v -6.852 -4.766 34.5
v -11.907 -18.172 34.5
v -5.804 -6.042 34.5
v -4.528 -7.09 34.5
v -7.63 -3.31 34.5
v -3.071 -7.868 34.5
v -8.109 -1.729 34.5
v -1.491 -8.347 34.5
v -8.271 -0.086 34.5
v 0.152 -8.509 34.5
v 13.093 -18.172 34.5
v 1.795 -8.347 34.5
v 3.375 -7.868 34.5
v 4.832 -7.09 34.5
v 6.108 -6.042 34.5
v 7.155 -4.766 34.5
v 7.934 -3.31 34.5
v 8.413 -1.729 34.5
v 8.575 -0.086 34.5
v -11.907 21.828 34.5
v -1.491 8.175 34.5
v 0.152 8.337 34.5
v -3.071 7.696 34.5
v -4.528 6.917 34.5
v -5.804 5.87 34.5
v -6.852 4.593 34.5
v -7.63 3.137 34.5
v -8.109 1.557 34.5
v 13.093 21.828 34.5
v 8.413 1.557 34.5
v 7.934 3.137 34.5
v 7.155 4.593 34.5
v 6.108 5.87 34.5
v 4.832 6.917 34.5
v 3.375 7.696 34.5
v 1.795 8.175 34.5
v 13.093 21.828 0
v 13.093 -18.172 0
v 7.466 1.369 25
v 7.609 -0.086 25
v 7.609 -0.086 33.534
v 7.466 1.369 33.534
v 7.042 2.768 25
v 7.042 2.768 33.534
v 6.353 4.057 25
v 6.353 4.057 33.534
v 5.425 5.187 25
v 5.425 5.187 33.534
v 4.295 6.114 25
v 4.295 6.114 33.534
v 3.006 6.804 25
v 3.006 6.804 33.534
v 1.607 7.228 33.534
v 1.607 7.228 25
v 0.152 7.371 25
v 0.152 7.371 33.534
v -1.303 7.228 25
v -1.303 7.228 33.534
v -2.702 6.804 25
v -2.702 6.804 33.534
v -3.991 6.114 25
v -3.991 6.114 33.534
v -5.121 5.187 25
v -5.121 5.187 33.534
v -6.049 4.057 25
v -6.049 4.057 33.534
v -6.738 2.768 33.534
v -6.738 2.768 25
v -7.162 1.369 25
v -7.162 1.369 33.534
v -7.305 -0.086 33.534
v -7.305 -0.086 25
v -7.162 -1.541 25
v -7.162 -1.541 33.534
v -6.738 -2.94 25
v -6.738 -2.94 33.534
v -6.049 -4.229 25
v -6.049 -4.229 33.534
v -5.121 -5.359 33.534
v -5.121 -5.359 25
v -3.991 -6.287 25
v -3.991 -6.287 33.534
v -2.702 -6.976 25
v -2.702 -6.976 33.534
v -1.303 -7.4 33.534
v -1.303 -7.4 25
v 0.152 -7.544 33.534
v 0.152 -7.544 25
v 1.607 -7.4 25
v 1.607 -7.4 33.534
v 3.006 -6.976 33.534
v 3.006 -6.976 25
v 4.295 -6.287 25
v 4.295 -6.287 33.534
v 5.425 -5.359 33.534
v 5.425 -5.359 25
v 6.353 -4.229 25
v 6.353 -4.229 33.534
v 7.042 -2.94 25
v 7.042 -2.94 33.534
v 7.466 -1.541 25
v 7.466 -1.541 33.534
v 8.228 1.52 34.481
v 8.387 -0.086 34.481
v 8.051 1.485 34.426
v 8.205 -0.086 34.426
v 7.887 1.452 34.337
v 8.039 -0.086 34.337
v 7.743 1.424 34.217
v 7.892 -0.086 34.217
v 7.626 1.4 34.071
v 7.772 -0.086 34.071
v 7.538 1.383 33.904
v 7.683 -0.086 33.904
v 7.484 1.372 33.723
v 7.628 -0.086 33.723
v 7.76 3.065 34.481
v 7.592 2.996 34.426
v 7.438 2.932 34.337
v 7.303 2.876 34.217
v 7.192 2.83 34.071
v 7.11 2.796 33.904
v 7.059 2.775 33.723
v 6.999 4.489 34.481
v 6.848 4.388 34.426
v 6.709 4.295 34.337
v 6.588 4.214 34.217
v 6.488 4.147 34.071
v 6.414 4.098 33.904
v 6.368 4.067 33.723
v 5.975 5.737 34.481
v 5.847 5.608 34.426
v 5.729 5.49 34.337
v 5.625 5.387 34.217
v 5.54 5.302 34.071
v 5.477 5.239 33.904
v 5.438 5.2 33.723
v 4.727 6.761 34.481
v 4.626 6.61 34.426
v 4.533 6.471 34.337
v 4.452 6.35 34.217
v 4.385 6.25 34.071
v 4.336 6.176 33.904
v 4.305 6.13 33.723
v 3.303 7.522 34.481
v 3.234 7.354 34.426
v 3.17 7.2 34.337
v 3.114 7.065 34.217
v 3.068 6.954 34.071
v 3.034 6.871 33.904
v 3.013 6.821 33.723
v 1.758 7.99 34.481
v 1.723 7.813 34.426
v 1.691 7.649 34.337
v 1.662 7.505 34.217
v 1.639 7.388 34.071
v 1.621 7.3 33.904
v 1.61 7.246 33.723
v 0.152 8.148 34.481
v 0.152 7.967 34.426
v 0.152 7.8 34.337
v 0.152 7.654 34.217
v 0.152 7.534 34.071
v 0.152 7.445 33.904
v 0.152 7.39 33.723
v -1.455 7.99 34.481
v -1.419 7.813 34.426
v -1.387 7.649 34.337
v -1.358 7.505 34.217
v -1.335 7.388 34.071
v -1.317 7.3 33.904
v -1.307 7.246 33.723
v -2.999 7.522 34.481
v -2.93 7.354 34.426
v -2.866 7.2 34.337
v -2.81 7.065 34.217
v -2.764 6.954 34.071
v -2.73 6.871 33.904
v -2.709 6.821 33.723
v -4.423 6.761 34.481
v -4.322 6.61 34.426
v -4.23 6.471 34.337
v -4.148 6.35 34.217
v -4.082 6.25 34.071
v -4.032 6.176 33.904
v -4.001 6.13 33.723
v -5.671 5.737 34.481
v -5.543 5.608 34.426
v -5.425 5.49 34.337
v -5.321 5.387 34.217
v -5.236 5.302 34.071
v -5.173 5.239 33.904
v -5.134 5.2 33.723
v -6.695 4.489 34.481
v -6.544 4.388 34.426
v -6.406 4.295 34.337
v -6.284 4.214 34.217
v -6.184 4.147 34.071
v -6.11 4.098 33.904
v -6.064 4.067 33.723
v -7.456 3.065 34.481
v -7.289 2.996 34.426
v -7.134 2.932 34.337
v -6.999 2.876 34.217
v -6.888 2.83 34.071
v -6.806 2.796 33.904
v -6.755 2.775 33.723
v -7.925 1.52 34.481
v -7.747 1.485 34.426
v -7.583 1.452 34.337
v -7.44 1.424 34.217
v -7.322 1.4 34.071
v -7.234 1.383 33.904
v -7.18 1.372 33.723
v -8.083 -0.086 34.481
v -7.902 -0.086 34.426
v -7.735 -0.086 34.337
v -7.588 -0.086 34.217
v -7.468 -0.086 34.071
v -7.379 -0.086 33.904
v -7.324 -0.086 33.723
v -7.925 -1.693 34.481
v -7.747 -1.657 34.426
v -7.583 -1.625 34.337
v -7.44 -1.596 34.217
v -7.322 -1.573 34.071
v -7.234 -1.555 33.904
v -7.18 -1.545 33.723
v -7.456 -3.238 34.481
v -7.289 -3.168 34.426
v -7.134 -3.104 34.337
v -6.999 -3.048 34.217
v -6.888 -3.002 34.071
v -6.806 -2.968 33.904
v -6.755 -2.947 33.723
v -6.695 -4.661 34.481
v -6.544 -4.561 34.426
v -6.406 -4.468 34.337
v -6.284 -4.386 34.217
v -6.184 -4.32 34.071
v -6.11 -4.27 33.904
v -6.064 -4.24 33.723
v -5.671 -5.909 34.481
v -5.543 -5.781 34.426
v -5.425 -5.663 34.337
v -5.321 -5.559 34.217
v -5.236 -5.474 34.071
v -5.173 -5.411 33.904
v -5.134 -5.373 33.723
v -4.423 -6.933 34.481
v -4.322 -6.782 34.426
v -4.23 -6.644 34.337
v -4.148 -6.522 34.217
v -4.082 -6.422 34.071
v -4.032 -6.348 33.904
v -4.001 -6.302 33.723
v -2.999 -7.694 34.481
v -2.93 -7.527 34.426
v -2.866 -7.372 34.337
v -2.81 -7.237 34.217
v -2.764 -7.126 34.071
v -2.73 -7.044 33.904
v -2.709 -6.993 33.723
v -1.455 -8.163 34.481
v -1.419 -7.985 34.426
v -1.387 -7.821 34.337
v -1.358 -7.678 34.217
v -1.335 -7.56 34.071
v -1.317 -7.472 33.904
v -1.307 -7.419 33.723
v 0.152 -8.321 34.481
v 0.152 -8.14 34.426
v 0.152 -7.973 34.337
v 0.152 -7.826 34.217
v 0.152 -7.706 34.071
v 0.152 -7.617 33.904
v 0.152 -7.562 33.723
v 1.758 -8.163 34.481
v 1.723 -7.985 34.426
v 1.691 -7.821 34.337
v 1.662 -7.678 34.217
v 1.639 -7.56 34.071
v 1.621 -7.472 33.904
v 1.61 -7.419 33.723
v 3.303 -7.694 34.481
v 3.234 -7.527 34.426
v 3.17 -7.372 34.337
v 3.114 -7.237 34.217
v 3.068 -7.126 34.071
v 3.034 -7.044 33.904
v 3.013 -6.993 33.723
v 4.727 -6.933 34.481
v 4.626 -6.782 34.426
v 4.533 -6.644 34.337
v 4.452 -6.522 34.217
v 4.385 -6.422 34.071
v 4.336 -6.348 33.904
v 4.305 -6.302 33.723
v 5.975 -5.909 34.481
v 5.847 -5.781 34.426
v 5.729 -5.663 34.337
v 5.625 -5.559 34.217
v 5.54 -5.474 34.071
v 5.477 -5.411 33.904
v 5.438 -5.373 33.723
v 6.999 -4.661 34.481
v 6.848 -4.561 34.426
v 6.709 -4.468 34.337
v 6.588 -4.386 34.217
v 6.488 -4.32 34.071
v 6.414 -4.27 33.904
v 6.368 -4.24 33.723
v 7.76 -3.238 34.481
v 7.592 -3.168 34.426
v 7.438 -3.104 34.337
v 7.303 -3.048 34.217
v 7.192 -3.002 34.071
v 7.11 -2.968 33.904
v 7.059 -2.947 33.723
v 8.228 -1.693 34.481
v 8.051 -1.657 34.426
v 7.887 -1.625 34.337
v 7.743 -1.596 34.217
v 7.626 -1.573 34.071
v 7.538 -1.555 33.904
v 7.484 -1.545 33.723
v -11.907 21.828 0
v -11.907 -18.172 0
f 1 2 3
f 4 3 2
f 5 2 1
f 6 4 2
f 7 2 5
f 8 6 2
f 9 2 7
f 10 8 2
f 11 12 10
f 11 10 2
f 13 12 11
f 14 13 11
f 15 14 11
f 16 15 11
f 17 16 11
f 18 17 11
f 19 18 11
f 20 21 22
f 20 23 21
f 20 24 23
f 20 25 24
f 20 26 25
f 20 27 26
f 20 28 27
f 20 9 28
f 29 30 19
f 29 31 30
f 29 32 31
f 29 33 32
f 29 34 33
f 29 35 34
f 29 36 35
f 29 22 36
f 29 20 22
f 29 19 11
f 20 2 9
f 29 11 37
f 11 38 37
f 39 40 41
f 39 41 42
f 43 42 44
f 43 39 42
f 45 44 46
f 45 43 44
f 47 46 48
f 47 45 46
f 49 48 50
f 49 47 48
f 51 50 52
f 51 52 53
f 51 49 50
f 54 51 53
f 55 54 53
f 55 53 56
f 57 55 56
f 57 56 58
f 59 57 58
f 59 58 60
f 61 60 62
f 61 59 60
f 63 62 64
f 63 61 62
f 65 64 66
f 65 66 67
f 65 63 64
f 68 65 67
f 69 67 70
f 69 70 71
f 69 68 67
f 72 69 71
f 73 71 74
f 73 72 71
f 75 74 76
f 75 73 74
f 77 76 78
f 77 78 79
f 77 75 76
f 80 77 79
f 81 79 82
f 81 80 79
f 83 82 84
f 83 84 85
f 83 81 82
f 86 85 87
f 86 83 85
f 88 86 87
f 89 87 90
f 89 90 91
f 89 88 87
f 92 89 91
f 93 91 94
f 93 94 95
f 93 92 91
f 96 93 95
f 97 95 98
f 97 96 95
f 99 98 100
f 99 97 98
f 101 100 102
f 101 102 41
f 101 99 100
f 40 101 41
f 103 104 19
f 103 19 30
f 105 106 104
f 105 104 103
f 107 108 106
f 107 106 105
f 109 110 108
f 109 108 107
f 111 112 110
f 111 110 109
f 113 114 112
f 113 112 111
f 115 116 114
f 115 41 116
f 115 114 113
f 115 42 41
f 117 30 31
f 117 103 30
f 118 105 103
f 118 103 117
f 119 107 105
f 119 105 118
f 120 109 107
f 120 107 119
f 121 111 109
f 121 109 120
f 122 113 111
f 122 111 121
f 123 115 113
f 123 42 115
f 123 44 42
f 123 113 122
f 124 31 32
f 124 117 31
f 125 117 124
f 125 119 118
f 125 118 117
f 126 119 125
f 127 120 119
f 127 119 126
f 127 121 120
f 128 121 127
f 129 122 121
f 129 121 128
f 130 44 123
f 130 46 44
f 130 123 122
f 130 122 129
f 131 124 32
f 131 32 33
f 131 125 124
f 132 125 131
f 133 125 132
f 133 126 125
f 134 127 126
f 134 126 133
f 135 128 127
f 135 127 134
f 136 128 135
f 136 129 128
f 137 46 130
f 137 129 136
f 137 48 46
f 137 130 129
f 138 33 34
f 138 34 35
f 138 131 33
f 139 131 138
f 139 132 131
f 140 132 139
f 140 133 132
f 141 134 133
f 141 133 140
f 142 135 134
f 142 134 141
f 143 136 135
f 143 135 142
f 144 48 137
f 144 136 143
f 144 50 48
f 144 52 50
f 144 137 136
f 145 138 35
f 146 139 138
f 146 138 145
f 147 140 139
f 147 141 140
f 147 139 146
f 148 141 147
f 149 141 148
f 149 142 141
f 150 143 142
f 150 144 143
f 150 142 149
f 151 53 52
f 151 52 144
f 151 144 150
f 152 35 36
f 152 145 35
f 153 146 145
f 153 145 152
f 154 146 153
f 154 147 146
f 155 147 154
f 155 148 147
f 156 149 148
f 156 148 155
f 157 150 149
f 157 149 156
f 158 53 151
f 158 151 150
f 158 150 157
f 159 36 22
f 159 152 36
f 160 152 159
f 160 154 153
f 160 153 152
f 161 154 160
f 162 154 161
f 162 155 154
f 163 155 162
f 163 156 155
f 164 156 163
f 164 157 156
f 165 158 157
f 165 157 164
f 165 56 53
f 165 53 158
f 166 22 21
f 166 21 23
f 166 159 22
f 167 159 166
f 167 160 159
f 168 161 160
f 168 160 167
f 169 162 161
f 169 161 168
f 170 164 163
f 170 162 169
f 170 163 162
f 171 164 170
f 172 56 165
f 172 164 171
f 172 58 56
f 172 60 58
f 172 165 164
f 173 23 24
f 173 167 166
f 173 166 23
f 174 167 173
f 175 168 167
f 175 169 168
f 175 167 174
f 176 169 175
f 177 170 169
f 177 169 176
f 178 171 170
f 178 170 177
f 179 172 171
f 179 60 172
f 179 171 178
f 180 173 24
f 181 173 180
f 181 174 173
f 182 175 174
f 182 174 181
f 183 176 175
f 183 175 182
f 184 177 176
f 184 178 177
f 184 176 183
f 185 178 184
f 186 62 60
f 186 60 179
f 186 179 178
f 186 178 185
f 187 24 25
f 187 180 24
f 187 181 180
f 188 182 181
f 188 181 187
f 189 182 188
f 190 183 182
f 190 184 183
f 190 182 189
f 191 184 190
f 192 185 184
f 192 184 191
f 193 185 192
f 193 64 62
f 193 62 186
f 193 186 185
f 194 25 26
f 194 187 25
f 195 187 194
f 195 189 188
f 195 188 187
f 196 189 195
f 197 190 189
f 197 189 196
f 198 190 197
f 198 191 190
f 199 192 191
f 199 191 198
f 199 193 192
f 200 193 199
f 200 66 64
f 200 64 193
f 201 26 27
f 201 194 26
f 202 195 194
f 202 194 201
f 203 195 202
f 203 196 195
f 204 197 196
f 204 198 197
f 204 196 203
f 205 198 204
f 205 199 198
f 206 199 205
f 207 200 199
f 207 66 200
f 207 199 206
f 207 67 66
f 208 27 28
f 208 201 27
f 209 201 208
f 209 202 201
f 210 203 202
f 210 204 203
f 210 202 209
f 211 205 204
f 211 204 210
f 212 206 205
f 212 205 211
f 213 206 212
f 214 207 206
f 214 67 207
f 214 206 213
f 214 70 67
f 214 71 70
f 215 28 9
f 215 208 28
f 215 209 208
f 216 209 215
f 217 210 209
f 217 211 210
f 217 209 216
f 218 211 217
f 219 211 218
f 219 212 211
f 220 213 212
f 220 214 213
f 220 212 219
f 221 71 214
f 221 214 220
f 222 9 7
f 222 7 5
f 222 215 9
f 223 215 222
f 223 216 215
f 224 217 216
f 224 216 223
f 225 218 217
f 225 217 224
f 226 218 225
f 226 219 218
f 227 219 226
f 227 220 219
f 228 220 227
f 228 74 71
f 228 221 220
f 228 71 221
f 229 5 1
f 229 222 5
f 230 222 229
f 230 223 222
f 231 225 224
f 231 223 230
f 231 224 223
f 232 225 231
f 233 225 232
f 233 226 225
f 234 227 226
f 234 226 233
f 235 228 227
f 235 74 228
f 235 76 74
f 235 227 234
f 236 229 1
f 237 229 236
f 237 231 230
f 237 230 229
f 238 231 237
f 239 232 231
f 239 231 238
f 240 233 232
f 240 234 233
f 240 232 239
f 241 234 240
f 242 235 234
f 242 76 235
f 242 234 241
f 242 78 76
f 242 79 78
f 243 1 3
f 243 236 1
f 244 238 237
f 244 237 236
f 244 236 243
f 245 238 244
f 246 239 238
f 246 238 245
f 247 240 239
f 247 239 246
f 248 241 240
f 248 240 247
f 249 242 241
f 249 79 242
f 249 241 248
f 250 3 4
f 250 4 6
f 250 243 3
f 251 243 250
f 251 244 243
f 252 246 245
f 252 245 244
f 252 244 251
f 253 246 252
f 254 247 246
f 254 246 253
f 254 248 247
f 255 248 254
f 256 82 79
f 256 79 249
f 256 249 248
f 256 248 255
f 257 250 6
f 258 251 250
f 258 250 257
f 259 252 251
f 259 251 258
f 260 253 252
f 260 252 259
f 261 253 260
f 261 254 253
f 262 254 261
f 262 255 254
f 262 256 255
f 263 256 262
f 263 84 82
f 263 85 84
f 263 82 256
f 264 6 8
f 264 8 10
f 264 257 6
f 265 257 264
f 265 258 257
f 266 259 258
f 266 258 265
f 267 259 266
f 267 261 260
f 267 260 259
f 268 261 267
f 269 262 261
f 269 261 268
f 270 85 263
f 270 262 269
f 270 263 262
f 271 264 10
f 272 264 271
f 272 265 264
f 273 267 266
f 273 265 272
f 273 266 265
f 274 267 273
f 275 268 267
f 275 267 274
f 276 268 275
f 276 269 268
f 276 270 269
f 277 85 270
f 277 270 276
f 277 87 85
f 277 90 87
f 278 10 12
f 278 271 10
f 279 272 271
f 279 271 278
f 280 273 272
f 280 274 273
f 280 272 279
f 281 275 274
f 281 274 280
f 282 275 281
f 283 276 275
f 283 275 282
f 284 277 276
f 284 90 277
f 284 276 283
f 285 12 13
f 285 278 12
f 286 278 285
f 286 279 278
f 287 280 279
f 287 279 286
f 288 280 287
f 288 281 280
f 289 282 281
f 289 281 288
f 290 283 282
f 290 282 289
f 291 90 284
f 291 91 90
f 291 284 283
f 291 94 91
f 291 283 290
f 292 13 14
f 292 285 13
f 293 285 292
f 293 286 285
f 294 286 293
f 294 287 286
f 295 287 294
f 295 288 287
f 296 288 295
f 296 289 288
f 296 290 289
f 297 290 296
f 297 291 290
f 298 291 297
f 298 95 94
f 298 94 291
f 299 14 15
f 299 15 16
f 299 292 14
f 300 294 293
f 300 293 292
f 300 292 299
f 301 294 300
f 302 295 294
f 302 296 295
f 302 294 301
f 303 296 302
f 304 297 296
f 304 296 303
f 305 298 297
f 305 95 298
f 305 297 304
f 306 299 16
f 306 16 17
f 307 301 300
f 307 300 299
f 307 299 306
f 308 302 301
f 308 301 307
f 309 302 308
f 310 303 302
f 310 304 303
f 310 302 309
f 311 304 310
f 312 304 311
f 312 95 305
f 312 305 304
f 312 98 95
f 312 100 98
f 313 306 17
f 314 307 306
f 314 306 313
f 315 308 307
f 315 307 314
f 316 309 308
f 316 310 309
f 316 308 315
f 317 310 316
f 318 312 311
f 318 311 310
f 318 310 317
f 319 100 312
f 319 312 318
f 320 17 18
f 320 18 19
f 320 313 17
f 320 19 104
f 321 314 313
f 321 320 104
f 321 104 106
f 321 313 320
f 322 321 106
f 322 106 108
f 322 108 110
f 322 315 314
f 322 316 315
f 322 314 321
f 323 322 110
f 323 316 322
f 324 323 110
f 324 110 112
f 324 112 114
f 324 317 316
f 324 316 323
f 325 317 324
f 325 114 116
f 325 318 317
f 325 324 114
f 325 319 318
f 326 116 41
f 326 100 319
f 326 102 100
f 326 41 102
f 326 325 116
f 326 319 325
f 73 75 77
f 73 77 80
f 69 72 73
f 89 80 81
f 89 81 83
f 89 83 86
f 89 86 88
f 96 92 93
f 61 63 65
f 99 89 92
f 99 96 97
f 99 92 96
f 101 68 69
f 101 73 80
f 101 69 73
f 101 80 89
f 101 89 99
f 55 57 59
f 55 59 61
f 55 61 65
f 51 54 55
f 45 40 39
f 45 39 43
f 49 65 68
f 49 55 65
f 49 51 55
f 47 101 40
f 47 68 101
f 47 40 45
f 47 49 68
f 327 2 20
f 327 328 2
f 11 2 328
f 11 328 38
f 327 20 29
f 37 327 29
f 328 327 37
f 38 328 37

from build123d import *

# Parameters (mm, degrees)
F0_W     = 25
F0_H     = 40
F1_DEPTH = 25
F2_W     = 25
F2_H     = 40
F2_R     = 7.4574120062
F3_DEPTH = 9.5
F5_R     = 0.9656854249


# Not quite as in the source:
# - the program builds the solid bodies; features that only make, move or delete a surface that nothing else refers to are left out


with BuildPart() as f1:
    # F0 (on Top) → F1 (new body)
    with BuildSketch(Plane.XY):
        with Locations((0.5926040933, 1.8275822699)):
            Rectangle(F0_W, F0_H)
    extrude(amount=F1_DEPTH)

    # F2 (on face) → F3 (join)
    with BuildSketch(Plane.XY.offset(25)):
        with Locations((0.5926040933, 1.8275822699)):
            Rectangle(F2_W, F2_H)
        with Locations((0.1519261859, -0.08621795)):
            Circle(F2_R, mode=Mode.SUBTRACT)
    extrude(amount=F3_DEPTH)

    # F5
    f5_edges = [f1.edges().sort_by_distance(p)[0] for p in [
        (-7.305486, -0.086218, 34.5),
    ]]
    fillet(f5_edges, radius=F5_R)


solid = f1.part
